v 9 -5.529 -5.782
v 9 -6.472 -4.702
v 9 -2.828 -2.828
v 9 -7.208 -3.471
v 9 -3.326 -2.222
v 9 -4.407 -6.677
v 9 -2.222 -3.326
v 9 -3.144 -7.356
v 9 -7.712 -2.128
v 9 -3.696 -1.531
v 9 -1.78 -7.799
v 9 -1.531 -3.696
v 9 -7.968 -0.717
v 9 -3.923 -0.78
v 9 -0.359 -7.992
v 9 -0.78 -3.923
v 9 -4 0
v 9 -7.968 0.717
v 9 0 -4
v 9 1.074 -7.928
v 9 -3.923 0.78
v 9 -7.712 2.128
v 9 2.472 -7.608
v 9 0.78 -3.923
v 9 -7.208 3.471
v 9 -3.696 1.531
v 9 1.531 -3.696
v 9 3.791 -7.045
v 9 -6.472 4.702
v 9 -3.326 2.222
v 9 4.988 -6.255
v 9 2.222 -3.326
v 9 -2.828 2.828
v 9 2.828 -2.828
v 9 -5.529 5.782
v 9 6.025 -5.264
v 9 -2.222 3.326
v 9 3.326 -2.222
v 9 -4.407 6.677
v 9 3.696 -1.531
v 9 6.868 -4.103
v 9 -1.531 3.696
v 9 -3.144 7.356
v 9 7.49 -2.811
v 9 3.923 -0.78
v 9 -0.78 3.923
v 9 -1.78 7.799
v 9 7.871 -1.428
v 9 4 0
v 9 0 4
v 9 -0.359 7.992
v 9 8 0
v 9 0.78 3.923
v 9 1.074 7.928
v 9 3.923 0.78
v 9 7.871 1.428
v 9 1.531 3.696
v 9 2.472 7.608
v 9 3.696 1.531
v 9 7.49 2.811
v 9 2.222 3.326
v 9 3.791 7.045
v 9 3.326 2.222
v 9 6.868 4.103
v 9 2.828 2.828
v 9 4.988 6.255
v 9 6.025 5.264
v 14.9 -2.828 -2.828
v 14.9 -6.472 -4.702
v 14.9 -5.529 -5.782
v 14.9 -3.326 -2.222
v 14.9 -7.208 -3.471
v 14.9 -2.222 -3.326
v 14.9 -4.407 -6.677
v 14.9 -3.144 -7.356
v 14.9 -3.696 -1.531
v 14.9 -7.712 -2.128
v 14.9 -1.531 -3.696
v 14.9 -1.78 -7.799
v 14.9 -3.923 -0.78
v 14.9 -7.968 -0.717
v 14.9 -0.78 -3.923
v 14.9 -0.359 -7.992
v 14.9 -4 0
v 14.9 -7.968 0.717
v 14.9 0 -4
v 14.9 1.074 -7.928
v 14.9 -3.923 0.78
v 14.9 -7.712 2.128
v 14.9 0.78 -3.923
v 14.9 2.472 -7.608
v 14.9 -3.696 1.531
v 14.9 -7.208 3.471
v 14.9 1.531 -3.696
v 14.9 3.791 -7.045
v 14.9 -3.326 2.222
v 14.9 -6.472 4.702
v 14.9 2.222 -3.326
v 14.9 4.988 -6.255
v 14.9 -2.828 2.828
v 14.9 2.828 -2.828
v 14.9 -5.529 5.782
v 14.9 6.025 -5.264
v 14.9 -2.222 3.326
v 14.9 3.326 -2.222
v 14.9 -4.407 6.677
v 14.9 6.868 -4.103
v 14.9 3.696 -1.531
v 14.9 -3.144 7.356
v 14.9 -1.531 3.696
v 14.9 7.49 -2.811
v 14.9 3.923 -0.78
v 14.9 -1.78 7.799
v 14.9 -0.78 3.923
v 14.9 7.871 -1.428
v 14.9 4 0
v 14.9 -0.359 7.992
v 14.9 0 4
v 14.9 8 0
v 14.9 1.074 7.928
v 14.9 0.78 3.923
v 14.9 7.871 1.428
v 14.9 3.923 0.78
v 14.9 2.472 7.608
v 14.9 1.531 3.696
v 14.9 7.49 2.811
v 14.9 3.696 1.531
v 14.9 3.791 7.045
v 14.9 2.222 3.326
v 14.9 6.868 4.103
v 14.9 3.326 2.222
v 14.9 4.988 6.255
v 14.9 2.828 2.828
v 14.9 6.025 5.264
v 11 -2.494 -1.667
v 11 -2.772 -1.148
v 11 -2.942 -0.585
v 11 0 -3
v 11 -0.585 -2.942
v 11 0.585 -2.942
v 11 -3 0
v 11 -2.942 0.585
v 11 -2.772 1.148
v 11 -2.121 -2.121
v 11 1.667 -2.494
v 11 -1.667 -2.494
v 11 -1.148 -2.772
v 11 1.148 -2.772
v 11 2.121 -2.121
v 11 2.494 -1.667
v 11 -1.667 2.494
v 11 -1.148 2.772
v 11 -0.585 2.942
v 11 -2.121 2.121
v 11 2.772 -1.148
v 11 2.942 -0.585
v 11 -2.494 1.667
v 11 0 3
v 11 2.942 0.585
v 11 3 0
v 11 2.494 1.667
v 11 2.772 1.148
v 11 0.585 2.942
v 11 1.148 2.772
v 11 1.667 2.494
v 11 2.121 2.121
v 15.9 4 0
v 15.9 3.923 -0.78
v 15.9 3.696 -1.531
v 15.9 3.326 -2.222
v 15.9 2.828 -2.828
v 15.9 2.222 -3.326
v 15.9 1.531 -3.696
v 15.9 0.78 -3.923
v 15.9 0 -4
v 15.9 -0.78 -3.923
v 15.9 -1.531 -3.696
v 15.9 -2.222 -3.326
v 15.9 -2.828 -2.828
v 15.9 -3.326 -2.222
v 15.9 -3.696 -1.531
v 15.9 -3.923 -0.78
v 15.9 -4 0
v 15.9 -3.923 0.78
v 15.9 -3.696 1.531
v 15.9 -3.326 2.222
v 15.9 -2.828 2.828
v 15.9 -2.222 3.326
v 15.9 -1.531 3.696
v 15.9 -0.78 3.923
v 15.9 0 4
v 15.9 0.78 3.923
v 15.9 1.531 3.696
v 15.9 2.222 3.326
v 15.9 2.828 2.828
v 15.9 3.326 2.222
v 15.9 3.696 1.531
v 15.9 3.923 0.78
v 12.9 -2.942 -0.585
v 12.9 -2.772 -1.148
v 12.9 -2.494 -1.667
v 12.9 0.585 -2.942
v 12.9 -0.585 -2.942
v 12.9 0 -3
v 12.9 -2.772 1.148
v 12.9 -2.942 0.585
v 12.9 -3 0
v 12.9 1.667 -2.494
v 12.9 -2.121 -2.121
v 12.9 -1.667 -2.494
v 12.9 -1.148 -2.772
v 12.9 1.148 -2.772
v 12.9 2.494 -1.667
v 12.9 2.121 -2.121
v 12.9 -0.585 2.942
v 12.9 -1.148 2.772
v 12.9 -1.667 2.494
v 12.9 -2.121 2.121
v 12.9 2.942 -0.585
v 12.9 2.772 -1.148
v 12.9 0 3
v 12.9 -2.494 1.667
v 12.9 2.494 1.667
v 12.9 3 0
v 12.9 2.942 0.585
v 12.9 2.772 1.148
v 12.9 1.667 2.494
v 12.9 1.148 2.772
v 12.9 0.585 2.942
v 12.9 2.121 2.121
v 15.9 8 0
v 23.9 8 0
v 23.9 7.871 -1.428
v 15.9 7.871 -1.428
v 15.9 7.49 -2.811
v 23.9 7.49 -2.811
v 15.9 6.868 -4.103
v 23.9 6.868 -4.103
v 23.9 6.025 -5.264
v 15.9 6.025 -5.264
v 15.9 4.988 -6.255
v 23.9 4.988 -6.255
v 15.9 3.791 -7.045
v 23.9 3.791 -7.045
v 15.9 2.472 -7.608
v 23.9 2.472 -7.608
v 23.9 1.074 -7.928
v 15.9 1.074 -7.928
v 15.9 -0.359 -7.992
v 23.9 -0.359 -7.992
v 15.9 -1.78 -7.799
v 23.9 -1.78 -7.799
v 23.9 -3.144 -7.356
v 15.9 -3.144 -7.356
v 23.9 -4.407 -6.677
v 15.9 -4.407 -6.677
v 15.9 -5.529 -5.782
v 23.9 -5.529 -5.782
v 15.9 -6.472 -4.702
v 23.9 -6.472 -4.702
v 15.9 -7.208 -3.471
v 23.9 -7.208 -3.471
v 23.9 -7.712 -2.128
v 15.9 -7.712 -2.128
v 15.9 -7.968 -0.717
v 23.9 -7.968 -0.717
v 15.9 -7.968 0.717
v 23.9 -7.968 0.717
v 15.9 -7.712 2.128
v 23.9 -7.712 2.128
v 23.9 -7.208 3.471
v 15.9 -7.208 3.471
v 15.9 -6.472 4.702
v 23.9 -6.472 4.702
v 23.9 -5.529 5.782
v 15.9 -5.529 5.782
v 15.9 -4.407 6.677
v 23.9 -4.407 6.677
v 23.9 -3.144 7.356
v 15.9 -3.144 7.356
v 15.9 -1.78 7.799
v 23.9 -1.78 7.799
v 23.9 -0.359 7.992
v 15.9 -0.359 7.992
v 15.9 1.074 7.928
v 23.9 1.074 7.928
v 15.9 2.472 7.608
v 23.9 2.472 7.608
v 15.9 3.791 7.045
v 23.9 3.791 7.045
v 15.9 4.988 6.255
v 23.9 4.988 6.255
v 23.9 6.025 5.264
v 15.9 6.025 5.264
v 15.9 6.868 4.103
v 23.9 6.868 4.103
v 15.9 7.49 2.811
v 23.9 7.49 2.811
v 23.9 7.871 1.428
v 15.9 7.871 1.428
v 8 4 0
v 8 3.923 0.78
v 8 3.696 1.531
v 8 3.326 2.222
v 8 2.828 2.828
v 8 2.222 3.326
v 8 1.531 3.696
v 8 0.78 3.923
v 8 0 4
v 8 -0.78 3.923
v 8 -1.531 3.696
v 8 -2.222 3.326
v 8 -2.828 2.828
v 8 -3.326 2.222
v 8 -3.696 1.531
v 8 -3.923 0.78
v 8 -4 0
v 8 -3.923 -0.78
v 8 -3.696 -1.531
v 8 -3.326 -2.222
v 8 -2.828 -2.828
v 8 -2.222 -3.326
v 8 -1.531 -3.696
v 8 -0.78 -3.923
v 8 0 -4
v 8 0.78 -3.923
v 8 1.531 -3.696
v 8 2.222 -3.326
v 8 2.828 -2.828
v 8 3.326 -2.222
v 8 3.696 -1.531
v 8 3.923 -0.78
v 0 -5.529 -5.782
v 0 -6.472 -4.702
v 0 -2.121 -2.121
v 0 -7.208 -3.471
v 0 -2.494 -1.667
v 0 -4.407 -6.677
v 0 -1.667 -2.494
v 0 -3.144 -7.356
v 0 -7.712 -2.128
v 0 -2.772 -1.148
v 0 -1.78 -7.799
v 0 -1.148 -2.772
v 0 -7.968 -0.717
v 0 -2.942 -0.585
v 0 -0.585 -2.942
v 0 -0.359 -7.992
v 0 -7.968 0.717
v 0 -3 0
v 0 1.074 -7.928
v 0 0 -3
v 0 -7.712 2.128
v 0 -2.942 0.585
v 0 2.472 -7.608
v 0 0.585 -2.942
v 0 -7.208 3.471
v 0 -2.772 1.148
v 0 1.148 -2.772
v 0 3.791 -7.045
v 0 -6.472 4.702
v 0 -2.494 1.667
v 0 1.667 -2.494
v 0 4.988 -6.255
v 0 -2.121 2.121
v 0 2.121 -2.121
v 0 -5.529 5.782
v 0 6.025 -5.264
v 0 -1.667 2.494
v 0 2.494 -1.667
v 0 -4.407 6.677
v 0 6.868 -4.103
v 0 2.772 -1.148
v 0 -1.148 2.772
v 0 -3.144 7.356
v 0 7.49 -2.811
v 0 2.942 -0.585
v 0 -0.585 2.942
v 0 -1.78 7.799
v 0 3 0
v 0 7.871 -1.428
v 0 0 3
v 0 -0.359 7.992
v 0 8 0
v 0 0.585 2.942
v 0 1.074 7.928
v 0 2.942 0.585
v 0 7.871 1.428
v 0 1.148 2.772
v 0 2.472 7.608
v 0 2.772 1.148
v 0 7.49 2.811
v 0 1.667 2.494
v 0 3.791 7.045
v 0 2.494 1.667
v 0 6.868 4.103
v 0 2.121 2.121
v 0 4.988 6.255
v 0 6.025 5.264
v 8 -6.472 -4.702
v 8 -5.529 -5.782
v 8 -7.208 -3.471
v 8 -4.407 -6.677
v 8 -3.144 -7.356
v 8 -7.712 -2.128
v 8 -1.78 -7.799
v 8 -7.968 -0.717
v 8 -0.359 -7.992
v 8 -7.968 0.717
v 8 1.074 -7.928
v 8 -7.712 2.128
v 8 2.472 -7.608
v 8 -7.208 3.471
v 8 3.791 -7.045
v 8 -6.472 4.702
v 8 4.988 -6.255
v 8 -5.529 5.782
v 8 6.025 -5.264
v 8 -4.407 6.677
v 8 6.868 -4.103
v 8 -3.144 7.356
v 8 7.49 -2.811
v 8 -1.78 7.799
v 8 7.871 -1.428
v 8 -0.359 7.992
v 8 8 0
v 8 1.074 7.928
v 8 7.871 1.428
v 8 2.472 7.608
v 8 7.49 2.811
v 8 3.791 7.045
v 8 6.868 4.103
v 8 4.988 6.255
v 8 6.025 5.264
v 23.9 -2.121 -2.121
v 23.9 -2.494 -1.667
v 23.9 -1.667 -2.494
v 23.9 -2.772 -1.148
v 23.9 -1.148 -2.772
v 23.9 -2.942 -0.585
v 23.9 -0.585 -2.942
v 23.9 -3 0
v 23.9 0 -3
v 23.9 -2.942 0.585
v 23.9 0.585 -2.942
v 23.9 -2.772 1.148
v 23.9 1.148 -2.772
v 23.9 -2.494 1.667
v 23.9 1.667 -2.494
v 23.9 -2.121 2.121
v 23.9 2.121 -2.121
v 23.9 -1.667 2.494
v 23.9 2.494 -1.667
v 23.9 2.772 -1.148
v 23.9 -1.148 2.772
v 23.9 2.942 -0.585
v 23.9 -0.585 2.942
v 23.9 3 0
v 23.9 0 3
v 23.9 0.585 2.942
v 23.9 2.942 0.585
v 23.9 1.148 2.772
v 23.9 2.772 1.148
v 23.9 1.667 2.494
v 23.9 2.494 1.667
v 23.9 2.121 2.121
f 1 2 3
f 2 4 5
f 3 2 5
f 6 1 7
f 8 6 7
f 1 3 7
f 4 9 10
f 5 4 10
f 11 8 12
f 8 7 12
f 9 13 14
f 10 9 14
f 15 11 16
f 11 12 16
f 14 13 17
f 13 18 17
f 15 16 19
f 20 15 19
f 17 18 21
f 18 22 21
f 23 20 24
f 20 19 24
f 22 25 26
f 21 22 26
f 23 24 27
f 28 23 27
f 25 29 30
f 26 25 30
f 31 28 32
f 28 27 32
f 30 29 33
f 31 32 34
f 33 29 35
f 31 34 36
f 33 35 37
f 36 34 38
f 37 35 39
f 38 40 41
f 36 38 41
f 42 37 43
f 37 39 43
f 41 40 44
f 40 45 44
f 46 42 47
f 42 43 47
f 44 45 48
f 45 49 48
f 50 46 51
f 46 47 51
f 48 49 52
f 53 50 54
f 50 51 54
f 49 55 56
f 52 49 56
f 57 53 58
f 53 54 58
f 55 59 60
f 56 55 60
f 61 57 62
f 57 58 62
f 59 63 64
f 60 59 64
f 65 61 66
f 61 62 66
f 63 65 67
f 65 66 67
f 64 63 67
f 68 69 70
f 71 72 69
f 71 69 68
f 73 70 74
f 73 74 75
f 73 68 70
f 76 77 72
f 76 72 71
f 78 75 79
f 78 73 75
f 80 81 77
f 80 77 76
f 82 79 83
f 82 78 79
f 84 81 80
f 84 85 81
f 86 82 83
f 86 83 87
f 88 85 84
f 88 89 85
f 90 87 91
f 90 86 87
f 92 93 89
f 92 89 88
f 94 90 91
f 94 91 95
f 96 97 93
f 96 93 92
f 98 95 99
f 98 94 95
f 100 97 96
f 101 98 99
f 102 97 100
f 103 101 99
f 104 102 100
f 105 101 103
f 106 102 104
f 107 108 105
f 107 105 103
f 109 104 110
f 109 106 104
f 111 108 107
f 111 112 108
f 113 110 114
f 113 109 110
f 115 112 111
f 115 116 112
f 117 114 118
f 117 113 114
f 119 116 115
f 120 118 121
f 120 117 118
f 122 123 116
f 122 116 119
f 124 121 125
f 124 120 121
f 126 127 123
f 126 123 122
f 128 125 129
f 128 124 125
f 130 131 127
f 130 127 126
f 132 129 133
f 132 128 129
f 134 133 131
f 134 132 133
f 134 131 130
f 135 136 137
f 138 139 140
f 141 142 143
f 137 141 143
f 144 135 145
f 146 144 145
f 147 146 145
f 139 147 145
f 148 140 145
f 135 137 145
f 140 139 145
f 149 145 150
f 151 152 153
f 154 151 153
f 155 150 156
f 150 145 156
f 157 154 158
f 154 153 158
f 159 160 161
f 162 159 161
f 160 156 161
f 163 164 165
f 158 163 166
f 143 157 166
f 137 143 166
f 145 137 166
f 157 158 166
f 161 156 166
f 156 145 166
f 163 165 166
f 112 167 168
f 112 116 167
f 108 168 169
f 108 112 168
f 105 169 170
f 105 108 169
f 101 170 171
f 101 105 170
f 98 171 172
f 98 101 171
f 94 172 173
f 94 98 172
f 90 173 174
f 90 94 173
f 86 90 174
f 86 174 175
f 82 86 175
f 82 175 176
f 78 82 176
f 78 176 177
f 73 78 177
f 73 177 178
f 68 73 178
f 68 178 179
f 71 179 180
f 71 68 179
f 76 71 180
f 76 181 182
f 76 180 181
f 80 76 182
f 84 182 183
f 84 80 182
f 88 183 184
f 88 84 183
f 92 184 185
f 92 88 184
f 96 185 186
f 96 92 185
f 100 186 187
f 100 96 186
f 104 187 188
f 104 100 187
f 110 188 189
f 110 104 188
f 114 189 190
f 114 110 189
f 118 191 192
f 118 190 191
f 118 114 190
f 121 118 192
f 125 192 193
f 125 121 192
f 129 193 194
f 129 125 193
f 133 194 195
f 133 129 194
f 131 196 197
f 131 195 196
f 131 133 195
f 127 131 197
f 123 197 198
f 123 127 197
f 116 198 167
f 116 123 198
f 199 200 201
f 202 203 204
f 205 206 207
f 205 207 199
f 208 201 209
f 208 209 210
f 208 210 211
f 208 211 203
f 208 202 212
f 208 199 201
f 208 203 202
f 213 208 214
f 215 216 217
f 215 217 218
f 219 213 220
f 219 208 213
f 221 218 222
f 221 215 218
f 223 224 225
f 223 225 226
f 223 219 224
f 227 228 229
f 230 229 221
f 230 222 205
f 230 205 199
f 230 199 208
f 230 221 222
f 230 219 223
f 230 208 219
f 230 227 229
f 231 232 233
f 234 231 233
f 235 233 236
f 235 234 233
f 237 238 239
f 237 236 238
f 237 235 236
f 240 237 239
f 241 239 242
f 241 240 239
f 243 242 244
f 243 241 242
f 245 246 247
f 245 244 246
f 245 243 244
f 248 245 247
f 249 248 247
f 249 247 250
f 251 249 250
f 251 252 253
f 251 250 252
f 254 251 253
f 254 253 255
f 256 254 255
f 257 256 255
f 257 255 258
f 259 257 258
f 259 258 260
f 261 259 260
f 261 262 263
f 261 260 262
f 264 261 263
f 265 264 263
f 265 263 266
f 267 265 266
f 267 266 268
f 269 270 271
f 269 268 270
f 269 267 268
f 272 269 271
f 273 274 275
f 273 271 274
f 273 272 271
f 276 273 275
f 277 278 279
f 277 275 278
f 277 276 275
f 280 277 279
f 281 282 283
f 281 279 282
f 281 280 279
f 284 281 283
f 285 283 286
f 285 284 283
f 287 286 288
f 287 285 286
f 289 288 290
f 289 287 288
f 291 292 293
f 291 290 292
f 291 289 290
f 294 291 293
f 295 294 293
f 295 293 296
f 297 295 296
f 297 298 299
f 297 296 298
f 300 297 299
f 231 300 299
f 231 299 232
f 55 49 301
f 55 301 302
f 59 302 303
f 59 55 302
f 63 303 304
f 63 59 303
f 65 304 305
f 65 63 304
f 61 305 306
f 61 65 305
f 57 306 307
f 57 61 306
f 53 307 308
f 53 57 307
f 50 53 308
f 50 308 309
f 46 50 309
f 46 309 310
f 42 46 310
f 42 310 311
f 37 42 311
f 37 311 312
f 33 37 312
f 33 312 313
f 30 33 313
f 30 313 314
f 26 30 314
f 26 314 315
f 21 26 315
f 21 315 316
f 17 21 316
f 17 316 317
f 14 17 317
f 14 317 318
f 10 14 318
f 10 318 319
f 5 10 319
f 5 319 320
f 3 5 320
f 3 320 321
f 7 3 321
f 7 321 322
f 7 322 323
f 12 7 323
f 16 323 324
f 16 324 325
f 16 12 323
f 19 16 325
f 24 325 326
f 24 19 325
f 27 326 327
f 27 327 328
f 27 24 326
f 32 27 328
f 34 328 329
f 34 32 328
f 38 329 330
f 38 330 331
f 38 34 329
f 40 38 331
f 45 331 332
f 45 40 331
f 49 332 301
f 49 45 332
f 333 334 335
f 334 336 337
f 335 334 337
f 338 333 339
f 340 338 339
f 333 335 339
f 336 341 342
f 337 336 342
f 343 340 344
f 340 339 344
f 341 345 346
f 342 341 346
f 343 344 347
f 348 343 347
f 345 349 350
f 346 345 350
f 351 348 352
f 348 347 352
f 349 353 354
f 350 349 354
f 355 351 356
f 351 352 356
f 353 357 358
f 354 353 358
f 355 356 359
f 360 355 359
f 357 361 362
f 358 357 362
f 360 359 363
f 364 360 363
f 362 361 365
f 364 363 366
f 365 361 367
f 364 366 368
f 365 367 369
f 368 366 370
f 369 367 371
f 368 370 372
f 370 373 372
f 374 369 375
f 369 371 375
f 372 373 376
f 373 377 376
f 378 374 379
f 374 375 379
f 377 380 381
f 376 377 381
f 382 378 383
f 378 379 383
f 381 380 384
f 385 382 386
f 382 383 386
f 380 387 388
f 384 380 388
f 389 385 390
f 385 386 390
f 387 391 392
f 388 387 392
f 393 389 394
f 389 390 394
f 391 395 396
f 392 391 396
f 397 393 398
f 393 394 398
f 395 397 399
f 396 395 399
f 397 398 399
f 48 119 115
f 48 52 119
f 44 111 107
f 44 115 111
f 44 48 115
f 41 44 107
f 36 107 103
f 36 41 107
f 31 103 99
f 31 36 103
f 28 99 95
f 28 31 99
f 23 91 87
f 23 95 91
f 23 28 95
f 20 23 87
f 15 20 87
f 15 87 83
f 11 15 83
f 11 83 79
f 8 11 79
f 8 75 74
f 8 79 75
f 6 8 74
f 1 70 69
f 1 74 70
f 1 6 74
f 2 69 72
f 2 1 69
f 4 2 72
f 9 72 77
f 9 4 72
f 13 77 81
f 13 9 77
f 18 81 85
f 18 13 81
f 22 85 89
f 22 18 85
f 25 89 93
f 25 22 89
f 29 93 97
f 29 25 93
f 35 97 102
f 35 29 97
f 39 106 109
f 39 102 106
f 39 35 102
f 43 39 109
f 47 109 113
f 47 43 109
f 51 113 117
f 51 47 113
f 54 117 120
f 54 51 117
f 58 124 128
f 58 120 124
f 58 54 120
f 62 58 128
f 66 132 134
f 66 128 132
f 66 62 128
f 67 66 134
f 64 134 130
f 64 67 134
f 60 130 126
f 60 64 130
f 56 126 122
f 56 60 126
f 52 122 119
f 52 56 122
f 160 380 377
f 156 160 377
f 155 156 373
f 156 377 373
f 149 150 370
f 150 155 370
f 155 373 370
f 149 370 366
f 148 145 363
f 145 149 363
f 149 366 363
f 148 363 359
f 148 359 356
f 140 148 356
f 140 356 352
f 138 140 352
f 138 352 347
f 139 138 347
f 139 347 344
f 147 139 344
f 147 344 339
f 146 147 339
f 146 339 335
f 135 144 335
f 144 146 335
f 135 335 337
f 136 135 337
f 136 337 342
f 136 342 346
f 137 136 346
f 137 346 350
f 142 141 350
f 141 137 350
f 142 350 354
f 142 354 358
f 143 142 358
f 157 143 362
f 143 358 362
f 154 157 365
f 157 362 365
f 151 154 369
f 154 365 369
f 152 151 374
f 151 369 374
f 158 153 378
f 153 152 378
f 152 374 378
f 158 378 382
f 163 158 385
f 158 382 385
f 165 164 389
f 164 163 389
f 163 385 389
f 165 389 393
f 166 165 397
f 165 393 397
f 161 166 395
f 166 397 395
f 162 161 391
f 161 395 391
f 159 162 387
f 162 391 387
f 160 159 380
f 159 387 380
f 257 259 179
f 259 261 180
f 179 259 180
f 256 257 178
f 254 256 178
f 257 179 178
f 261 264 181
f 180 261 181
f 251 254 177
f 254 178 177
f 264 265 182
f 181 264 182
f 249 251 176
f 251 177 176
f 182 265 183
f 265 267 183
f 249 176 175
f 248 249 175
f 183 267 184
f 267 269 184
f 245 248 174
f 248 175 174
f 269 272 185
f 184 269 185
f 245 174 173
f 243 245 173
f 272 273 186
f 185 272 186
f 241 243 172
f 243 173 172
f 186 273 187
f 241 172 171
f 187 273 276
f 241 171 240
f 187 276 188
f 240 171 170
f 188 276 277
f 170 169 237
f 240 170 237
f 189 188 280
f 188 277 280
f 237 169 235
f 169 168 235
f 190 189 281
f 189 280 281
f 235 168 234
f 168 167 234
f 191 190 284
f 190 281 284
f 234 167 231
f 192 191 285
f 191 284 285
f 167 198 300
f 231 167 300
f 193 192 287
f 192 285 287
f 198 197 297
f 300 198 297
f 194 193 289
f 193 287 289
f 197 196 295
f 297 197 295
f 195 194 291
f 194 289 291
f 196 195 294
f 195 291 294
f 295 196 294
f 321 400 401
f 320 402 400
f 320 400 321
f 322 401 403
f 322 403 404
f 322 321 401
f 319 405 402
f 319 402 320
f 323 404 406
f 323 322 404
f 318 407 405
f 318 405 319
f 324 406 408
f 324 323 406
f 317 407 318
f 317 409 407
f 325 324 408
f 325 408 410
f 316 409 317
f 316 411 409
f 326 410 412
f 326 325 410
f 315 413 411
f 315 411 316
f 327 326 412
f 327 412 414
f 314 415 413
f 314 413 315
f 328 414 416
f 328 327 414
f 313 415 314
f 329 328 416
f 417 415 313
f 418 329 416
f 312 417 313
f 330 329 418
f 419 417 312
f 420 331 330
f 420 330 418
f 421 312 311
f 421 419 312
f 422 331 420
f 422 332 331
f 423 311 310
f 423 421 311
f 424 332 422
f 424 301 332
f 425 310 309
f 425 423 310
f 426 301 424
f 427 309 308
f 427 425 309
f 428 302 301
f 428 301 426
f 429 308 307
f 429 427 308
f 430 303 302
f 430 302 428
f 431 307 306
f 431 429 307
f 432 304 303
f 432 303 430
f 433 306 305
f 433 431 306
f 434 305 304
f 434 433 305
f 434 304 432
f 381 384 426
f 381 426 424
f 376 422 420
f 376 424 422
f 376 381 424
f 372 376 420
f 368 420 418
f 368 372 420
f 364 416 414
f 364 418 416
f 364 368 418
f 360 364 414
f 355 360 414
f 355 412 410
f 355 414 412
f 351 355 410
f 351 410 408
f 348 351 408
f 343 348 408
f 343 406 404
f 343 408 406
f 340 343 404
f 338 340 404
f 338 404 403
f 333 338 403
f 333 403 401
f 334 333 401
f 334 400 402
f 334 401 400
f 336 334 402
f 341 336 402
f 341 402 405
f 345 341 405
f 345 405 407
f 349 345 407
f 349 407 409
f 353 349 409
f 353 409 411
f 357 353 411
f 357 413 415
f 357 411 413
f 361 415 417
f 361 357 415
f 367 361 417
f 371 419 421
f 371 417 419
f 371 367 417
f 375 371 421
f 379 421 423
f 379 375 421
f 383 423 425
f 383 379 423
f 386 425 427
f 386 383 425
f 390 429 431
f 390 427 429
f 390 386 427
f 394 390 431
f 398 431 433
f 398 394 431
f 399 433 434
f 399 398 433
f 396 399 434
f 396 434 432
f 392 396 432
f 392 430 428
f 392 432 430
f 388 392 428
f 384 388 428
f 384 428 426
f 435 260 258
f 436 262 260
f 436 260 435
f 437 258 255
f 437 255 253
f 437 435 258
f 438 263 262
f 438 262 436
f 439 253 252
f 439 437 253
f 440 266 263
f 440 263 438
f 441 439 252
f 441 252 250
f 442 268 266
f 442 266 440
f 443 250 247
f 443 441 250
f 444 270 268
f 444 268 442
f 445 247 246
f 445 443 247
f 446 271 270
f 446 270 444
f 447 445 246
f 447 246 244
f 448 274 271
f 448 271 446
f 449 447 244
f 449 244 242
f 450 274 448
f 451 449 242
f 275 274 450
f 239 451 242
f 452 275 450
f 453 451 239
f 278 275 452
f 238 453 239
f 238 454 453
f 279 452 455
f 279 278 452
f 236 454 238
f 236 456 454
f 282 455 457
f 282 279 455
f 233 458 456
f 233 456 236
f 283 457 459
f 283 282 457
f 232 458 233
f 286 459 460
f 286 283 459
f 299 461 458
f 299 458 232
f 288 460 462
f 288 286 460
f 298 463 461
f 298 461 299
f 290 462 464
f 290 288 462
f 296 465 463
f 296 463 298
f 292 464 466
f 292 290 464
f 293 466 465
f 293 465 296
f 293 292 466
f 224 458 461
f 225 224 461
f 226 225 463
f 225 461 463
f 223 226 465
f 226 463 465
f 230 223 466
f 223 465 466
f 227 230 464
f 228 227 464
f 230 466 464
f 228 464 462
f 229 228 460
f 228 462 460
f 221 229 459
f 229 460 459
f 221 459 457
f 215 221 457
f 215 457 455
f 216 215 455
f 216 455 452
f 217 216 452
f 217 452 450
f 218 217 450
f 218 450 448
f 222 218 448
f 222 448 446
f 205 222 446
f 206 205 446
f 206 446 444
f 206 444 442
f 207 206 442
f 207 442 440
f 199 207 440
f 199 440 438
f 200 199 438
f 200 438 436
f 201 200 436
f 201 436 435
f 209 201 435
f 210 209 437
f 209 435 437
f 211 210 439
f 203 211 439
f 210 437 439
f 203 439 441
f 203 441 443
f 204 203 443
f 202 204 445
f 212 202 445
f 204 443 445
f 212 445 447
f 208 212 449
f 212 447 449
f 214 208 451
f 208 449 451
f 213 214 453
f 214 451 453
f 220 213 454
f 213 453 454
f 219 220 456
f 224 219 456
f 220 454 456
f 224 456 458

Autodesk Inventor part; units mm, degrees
ref_plane "YZ Plane" through (0, 0, 0) normal (1, 0, 0) x (0, 1, 0)
ref_plane "XZ Plane" through (0, 0, 0) normal (0, 1, 0) x (-1, 0, 0)
ref_plane "XY Plane" through (0, 0, 0) normal (0, 0, 1) x (1, 0, 0)
sketch "スケッチ1" plane through (0, 0, 0) normal (0, 0, 1) x (1, 0, 0)
  line L0 (0, 0) -> (23.9, 0)
  line L1 (23.9, 0) -> (23.9, 8)
  line L2 (23.9, 8) -> (0, 8)
  line L3 (0, 8) -> (0, 0)
  line L4 (0, 0) -> (11, 0)
  line L5 (11, 0) -> (11, 3)
  line L6 (11, 3) -> (0, 3)
  line L7 (0, 3) -> (0, 0)
  line L8 (23.9, 0) -> (12.9, 0)
  line L9 (12.9, 0) -> (12.9, 3)
  line L10 (12.9, 3) -> (23.9, 3)
  line L11 (23.9, 3) -> (23.9, 0)
  line L12 (9, 8) -> (14.9, 8)
  line L13 (14.9, 8) -> (14.9, 0)
  line L14 (14.9, 0) -> (9, 0)
  line L15 (9, 0) -> (9, 8)
  line L16 (9, 8) -> (8, 8)
  line L17 (8, 8) -> (8, 4)
  line L18 (8, 4) -> (9, 4)
  line L19 (9, 4) -> (9, 8)
  line L20 (14.9, 8) -> (15.9, 8)
  line L21 (15.9, 8) -> (15.9, 4)
  line L22 (15.9, 4) -> (14.9, 4)
  line L23 (14.9, 4) -> (14.9, 8)
  dimension "d0" = 8
  dimension "d1" = 23.9
  dimension "d2" = 11
  dimension "d3" = 3
  dimension "d4" = 11
  dimension "d5" = 3
  dimension "d6" = 2
  dimension "d7" = 2
  dimension "d8" = 1
  dimension "d9" = 4
  dimension "d10" = 1
  dimension "d11" = 4
revolve "回転1" add sketch "スケッチ1" angle 360 about axis through (0, 0, 0) along (1, 0, 0) contours L3 L2 L17 L18 L15 L6 | L5 L6 L15 L2 L13 L10 L9 L0 | L13 L22 L21 L2 L1 L10
properties part number "Coupling_SOH_16C_6_6" material "アルミニウム 6061"
